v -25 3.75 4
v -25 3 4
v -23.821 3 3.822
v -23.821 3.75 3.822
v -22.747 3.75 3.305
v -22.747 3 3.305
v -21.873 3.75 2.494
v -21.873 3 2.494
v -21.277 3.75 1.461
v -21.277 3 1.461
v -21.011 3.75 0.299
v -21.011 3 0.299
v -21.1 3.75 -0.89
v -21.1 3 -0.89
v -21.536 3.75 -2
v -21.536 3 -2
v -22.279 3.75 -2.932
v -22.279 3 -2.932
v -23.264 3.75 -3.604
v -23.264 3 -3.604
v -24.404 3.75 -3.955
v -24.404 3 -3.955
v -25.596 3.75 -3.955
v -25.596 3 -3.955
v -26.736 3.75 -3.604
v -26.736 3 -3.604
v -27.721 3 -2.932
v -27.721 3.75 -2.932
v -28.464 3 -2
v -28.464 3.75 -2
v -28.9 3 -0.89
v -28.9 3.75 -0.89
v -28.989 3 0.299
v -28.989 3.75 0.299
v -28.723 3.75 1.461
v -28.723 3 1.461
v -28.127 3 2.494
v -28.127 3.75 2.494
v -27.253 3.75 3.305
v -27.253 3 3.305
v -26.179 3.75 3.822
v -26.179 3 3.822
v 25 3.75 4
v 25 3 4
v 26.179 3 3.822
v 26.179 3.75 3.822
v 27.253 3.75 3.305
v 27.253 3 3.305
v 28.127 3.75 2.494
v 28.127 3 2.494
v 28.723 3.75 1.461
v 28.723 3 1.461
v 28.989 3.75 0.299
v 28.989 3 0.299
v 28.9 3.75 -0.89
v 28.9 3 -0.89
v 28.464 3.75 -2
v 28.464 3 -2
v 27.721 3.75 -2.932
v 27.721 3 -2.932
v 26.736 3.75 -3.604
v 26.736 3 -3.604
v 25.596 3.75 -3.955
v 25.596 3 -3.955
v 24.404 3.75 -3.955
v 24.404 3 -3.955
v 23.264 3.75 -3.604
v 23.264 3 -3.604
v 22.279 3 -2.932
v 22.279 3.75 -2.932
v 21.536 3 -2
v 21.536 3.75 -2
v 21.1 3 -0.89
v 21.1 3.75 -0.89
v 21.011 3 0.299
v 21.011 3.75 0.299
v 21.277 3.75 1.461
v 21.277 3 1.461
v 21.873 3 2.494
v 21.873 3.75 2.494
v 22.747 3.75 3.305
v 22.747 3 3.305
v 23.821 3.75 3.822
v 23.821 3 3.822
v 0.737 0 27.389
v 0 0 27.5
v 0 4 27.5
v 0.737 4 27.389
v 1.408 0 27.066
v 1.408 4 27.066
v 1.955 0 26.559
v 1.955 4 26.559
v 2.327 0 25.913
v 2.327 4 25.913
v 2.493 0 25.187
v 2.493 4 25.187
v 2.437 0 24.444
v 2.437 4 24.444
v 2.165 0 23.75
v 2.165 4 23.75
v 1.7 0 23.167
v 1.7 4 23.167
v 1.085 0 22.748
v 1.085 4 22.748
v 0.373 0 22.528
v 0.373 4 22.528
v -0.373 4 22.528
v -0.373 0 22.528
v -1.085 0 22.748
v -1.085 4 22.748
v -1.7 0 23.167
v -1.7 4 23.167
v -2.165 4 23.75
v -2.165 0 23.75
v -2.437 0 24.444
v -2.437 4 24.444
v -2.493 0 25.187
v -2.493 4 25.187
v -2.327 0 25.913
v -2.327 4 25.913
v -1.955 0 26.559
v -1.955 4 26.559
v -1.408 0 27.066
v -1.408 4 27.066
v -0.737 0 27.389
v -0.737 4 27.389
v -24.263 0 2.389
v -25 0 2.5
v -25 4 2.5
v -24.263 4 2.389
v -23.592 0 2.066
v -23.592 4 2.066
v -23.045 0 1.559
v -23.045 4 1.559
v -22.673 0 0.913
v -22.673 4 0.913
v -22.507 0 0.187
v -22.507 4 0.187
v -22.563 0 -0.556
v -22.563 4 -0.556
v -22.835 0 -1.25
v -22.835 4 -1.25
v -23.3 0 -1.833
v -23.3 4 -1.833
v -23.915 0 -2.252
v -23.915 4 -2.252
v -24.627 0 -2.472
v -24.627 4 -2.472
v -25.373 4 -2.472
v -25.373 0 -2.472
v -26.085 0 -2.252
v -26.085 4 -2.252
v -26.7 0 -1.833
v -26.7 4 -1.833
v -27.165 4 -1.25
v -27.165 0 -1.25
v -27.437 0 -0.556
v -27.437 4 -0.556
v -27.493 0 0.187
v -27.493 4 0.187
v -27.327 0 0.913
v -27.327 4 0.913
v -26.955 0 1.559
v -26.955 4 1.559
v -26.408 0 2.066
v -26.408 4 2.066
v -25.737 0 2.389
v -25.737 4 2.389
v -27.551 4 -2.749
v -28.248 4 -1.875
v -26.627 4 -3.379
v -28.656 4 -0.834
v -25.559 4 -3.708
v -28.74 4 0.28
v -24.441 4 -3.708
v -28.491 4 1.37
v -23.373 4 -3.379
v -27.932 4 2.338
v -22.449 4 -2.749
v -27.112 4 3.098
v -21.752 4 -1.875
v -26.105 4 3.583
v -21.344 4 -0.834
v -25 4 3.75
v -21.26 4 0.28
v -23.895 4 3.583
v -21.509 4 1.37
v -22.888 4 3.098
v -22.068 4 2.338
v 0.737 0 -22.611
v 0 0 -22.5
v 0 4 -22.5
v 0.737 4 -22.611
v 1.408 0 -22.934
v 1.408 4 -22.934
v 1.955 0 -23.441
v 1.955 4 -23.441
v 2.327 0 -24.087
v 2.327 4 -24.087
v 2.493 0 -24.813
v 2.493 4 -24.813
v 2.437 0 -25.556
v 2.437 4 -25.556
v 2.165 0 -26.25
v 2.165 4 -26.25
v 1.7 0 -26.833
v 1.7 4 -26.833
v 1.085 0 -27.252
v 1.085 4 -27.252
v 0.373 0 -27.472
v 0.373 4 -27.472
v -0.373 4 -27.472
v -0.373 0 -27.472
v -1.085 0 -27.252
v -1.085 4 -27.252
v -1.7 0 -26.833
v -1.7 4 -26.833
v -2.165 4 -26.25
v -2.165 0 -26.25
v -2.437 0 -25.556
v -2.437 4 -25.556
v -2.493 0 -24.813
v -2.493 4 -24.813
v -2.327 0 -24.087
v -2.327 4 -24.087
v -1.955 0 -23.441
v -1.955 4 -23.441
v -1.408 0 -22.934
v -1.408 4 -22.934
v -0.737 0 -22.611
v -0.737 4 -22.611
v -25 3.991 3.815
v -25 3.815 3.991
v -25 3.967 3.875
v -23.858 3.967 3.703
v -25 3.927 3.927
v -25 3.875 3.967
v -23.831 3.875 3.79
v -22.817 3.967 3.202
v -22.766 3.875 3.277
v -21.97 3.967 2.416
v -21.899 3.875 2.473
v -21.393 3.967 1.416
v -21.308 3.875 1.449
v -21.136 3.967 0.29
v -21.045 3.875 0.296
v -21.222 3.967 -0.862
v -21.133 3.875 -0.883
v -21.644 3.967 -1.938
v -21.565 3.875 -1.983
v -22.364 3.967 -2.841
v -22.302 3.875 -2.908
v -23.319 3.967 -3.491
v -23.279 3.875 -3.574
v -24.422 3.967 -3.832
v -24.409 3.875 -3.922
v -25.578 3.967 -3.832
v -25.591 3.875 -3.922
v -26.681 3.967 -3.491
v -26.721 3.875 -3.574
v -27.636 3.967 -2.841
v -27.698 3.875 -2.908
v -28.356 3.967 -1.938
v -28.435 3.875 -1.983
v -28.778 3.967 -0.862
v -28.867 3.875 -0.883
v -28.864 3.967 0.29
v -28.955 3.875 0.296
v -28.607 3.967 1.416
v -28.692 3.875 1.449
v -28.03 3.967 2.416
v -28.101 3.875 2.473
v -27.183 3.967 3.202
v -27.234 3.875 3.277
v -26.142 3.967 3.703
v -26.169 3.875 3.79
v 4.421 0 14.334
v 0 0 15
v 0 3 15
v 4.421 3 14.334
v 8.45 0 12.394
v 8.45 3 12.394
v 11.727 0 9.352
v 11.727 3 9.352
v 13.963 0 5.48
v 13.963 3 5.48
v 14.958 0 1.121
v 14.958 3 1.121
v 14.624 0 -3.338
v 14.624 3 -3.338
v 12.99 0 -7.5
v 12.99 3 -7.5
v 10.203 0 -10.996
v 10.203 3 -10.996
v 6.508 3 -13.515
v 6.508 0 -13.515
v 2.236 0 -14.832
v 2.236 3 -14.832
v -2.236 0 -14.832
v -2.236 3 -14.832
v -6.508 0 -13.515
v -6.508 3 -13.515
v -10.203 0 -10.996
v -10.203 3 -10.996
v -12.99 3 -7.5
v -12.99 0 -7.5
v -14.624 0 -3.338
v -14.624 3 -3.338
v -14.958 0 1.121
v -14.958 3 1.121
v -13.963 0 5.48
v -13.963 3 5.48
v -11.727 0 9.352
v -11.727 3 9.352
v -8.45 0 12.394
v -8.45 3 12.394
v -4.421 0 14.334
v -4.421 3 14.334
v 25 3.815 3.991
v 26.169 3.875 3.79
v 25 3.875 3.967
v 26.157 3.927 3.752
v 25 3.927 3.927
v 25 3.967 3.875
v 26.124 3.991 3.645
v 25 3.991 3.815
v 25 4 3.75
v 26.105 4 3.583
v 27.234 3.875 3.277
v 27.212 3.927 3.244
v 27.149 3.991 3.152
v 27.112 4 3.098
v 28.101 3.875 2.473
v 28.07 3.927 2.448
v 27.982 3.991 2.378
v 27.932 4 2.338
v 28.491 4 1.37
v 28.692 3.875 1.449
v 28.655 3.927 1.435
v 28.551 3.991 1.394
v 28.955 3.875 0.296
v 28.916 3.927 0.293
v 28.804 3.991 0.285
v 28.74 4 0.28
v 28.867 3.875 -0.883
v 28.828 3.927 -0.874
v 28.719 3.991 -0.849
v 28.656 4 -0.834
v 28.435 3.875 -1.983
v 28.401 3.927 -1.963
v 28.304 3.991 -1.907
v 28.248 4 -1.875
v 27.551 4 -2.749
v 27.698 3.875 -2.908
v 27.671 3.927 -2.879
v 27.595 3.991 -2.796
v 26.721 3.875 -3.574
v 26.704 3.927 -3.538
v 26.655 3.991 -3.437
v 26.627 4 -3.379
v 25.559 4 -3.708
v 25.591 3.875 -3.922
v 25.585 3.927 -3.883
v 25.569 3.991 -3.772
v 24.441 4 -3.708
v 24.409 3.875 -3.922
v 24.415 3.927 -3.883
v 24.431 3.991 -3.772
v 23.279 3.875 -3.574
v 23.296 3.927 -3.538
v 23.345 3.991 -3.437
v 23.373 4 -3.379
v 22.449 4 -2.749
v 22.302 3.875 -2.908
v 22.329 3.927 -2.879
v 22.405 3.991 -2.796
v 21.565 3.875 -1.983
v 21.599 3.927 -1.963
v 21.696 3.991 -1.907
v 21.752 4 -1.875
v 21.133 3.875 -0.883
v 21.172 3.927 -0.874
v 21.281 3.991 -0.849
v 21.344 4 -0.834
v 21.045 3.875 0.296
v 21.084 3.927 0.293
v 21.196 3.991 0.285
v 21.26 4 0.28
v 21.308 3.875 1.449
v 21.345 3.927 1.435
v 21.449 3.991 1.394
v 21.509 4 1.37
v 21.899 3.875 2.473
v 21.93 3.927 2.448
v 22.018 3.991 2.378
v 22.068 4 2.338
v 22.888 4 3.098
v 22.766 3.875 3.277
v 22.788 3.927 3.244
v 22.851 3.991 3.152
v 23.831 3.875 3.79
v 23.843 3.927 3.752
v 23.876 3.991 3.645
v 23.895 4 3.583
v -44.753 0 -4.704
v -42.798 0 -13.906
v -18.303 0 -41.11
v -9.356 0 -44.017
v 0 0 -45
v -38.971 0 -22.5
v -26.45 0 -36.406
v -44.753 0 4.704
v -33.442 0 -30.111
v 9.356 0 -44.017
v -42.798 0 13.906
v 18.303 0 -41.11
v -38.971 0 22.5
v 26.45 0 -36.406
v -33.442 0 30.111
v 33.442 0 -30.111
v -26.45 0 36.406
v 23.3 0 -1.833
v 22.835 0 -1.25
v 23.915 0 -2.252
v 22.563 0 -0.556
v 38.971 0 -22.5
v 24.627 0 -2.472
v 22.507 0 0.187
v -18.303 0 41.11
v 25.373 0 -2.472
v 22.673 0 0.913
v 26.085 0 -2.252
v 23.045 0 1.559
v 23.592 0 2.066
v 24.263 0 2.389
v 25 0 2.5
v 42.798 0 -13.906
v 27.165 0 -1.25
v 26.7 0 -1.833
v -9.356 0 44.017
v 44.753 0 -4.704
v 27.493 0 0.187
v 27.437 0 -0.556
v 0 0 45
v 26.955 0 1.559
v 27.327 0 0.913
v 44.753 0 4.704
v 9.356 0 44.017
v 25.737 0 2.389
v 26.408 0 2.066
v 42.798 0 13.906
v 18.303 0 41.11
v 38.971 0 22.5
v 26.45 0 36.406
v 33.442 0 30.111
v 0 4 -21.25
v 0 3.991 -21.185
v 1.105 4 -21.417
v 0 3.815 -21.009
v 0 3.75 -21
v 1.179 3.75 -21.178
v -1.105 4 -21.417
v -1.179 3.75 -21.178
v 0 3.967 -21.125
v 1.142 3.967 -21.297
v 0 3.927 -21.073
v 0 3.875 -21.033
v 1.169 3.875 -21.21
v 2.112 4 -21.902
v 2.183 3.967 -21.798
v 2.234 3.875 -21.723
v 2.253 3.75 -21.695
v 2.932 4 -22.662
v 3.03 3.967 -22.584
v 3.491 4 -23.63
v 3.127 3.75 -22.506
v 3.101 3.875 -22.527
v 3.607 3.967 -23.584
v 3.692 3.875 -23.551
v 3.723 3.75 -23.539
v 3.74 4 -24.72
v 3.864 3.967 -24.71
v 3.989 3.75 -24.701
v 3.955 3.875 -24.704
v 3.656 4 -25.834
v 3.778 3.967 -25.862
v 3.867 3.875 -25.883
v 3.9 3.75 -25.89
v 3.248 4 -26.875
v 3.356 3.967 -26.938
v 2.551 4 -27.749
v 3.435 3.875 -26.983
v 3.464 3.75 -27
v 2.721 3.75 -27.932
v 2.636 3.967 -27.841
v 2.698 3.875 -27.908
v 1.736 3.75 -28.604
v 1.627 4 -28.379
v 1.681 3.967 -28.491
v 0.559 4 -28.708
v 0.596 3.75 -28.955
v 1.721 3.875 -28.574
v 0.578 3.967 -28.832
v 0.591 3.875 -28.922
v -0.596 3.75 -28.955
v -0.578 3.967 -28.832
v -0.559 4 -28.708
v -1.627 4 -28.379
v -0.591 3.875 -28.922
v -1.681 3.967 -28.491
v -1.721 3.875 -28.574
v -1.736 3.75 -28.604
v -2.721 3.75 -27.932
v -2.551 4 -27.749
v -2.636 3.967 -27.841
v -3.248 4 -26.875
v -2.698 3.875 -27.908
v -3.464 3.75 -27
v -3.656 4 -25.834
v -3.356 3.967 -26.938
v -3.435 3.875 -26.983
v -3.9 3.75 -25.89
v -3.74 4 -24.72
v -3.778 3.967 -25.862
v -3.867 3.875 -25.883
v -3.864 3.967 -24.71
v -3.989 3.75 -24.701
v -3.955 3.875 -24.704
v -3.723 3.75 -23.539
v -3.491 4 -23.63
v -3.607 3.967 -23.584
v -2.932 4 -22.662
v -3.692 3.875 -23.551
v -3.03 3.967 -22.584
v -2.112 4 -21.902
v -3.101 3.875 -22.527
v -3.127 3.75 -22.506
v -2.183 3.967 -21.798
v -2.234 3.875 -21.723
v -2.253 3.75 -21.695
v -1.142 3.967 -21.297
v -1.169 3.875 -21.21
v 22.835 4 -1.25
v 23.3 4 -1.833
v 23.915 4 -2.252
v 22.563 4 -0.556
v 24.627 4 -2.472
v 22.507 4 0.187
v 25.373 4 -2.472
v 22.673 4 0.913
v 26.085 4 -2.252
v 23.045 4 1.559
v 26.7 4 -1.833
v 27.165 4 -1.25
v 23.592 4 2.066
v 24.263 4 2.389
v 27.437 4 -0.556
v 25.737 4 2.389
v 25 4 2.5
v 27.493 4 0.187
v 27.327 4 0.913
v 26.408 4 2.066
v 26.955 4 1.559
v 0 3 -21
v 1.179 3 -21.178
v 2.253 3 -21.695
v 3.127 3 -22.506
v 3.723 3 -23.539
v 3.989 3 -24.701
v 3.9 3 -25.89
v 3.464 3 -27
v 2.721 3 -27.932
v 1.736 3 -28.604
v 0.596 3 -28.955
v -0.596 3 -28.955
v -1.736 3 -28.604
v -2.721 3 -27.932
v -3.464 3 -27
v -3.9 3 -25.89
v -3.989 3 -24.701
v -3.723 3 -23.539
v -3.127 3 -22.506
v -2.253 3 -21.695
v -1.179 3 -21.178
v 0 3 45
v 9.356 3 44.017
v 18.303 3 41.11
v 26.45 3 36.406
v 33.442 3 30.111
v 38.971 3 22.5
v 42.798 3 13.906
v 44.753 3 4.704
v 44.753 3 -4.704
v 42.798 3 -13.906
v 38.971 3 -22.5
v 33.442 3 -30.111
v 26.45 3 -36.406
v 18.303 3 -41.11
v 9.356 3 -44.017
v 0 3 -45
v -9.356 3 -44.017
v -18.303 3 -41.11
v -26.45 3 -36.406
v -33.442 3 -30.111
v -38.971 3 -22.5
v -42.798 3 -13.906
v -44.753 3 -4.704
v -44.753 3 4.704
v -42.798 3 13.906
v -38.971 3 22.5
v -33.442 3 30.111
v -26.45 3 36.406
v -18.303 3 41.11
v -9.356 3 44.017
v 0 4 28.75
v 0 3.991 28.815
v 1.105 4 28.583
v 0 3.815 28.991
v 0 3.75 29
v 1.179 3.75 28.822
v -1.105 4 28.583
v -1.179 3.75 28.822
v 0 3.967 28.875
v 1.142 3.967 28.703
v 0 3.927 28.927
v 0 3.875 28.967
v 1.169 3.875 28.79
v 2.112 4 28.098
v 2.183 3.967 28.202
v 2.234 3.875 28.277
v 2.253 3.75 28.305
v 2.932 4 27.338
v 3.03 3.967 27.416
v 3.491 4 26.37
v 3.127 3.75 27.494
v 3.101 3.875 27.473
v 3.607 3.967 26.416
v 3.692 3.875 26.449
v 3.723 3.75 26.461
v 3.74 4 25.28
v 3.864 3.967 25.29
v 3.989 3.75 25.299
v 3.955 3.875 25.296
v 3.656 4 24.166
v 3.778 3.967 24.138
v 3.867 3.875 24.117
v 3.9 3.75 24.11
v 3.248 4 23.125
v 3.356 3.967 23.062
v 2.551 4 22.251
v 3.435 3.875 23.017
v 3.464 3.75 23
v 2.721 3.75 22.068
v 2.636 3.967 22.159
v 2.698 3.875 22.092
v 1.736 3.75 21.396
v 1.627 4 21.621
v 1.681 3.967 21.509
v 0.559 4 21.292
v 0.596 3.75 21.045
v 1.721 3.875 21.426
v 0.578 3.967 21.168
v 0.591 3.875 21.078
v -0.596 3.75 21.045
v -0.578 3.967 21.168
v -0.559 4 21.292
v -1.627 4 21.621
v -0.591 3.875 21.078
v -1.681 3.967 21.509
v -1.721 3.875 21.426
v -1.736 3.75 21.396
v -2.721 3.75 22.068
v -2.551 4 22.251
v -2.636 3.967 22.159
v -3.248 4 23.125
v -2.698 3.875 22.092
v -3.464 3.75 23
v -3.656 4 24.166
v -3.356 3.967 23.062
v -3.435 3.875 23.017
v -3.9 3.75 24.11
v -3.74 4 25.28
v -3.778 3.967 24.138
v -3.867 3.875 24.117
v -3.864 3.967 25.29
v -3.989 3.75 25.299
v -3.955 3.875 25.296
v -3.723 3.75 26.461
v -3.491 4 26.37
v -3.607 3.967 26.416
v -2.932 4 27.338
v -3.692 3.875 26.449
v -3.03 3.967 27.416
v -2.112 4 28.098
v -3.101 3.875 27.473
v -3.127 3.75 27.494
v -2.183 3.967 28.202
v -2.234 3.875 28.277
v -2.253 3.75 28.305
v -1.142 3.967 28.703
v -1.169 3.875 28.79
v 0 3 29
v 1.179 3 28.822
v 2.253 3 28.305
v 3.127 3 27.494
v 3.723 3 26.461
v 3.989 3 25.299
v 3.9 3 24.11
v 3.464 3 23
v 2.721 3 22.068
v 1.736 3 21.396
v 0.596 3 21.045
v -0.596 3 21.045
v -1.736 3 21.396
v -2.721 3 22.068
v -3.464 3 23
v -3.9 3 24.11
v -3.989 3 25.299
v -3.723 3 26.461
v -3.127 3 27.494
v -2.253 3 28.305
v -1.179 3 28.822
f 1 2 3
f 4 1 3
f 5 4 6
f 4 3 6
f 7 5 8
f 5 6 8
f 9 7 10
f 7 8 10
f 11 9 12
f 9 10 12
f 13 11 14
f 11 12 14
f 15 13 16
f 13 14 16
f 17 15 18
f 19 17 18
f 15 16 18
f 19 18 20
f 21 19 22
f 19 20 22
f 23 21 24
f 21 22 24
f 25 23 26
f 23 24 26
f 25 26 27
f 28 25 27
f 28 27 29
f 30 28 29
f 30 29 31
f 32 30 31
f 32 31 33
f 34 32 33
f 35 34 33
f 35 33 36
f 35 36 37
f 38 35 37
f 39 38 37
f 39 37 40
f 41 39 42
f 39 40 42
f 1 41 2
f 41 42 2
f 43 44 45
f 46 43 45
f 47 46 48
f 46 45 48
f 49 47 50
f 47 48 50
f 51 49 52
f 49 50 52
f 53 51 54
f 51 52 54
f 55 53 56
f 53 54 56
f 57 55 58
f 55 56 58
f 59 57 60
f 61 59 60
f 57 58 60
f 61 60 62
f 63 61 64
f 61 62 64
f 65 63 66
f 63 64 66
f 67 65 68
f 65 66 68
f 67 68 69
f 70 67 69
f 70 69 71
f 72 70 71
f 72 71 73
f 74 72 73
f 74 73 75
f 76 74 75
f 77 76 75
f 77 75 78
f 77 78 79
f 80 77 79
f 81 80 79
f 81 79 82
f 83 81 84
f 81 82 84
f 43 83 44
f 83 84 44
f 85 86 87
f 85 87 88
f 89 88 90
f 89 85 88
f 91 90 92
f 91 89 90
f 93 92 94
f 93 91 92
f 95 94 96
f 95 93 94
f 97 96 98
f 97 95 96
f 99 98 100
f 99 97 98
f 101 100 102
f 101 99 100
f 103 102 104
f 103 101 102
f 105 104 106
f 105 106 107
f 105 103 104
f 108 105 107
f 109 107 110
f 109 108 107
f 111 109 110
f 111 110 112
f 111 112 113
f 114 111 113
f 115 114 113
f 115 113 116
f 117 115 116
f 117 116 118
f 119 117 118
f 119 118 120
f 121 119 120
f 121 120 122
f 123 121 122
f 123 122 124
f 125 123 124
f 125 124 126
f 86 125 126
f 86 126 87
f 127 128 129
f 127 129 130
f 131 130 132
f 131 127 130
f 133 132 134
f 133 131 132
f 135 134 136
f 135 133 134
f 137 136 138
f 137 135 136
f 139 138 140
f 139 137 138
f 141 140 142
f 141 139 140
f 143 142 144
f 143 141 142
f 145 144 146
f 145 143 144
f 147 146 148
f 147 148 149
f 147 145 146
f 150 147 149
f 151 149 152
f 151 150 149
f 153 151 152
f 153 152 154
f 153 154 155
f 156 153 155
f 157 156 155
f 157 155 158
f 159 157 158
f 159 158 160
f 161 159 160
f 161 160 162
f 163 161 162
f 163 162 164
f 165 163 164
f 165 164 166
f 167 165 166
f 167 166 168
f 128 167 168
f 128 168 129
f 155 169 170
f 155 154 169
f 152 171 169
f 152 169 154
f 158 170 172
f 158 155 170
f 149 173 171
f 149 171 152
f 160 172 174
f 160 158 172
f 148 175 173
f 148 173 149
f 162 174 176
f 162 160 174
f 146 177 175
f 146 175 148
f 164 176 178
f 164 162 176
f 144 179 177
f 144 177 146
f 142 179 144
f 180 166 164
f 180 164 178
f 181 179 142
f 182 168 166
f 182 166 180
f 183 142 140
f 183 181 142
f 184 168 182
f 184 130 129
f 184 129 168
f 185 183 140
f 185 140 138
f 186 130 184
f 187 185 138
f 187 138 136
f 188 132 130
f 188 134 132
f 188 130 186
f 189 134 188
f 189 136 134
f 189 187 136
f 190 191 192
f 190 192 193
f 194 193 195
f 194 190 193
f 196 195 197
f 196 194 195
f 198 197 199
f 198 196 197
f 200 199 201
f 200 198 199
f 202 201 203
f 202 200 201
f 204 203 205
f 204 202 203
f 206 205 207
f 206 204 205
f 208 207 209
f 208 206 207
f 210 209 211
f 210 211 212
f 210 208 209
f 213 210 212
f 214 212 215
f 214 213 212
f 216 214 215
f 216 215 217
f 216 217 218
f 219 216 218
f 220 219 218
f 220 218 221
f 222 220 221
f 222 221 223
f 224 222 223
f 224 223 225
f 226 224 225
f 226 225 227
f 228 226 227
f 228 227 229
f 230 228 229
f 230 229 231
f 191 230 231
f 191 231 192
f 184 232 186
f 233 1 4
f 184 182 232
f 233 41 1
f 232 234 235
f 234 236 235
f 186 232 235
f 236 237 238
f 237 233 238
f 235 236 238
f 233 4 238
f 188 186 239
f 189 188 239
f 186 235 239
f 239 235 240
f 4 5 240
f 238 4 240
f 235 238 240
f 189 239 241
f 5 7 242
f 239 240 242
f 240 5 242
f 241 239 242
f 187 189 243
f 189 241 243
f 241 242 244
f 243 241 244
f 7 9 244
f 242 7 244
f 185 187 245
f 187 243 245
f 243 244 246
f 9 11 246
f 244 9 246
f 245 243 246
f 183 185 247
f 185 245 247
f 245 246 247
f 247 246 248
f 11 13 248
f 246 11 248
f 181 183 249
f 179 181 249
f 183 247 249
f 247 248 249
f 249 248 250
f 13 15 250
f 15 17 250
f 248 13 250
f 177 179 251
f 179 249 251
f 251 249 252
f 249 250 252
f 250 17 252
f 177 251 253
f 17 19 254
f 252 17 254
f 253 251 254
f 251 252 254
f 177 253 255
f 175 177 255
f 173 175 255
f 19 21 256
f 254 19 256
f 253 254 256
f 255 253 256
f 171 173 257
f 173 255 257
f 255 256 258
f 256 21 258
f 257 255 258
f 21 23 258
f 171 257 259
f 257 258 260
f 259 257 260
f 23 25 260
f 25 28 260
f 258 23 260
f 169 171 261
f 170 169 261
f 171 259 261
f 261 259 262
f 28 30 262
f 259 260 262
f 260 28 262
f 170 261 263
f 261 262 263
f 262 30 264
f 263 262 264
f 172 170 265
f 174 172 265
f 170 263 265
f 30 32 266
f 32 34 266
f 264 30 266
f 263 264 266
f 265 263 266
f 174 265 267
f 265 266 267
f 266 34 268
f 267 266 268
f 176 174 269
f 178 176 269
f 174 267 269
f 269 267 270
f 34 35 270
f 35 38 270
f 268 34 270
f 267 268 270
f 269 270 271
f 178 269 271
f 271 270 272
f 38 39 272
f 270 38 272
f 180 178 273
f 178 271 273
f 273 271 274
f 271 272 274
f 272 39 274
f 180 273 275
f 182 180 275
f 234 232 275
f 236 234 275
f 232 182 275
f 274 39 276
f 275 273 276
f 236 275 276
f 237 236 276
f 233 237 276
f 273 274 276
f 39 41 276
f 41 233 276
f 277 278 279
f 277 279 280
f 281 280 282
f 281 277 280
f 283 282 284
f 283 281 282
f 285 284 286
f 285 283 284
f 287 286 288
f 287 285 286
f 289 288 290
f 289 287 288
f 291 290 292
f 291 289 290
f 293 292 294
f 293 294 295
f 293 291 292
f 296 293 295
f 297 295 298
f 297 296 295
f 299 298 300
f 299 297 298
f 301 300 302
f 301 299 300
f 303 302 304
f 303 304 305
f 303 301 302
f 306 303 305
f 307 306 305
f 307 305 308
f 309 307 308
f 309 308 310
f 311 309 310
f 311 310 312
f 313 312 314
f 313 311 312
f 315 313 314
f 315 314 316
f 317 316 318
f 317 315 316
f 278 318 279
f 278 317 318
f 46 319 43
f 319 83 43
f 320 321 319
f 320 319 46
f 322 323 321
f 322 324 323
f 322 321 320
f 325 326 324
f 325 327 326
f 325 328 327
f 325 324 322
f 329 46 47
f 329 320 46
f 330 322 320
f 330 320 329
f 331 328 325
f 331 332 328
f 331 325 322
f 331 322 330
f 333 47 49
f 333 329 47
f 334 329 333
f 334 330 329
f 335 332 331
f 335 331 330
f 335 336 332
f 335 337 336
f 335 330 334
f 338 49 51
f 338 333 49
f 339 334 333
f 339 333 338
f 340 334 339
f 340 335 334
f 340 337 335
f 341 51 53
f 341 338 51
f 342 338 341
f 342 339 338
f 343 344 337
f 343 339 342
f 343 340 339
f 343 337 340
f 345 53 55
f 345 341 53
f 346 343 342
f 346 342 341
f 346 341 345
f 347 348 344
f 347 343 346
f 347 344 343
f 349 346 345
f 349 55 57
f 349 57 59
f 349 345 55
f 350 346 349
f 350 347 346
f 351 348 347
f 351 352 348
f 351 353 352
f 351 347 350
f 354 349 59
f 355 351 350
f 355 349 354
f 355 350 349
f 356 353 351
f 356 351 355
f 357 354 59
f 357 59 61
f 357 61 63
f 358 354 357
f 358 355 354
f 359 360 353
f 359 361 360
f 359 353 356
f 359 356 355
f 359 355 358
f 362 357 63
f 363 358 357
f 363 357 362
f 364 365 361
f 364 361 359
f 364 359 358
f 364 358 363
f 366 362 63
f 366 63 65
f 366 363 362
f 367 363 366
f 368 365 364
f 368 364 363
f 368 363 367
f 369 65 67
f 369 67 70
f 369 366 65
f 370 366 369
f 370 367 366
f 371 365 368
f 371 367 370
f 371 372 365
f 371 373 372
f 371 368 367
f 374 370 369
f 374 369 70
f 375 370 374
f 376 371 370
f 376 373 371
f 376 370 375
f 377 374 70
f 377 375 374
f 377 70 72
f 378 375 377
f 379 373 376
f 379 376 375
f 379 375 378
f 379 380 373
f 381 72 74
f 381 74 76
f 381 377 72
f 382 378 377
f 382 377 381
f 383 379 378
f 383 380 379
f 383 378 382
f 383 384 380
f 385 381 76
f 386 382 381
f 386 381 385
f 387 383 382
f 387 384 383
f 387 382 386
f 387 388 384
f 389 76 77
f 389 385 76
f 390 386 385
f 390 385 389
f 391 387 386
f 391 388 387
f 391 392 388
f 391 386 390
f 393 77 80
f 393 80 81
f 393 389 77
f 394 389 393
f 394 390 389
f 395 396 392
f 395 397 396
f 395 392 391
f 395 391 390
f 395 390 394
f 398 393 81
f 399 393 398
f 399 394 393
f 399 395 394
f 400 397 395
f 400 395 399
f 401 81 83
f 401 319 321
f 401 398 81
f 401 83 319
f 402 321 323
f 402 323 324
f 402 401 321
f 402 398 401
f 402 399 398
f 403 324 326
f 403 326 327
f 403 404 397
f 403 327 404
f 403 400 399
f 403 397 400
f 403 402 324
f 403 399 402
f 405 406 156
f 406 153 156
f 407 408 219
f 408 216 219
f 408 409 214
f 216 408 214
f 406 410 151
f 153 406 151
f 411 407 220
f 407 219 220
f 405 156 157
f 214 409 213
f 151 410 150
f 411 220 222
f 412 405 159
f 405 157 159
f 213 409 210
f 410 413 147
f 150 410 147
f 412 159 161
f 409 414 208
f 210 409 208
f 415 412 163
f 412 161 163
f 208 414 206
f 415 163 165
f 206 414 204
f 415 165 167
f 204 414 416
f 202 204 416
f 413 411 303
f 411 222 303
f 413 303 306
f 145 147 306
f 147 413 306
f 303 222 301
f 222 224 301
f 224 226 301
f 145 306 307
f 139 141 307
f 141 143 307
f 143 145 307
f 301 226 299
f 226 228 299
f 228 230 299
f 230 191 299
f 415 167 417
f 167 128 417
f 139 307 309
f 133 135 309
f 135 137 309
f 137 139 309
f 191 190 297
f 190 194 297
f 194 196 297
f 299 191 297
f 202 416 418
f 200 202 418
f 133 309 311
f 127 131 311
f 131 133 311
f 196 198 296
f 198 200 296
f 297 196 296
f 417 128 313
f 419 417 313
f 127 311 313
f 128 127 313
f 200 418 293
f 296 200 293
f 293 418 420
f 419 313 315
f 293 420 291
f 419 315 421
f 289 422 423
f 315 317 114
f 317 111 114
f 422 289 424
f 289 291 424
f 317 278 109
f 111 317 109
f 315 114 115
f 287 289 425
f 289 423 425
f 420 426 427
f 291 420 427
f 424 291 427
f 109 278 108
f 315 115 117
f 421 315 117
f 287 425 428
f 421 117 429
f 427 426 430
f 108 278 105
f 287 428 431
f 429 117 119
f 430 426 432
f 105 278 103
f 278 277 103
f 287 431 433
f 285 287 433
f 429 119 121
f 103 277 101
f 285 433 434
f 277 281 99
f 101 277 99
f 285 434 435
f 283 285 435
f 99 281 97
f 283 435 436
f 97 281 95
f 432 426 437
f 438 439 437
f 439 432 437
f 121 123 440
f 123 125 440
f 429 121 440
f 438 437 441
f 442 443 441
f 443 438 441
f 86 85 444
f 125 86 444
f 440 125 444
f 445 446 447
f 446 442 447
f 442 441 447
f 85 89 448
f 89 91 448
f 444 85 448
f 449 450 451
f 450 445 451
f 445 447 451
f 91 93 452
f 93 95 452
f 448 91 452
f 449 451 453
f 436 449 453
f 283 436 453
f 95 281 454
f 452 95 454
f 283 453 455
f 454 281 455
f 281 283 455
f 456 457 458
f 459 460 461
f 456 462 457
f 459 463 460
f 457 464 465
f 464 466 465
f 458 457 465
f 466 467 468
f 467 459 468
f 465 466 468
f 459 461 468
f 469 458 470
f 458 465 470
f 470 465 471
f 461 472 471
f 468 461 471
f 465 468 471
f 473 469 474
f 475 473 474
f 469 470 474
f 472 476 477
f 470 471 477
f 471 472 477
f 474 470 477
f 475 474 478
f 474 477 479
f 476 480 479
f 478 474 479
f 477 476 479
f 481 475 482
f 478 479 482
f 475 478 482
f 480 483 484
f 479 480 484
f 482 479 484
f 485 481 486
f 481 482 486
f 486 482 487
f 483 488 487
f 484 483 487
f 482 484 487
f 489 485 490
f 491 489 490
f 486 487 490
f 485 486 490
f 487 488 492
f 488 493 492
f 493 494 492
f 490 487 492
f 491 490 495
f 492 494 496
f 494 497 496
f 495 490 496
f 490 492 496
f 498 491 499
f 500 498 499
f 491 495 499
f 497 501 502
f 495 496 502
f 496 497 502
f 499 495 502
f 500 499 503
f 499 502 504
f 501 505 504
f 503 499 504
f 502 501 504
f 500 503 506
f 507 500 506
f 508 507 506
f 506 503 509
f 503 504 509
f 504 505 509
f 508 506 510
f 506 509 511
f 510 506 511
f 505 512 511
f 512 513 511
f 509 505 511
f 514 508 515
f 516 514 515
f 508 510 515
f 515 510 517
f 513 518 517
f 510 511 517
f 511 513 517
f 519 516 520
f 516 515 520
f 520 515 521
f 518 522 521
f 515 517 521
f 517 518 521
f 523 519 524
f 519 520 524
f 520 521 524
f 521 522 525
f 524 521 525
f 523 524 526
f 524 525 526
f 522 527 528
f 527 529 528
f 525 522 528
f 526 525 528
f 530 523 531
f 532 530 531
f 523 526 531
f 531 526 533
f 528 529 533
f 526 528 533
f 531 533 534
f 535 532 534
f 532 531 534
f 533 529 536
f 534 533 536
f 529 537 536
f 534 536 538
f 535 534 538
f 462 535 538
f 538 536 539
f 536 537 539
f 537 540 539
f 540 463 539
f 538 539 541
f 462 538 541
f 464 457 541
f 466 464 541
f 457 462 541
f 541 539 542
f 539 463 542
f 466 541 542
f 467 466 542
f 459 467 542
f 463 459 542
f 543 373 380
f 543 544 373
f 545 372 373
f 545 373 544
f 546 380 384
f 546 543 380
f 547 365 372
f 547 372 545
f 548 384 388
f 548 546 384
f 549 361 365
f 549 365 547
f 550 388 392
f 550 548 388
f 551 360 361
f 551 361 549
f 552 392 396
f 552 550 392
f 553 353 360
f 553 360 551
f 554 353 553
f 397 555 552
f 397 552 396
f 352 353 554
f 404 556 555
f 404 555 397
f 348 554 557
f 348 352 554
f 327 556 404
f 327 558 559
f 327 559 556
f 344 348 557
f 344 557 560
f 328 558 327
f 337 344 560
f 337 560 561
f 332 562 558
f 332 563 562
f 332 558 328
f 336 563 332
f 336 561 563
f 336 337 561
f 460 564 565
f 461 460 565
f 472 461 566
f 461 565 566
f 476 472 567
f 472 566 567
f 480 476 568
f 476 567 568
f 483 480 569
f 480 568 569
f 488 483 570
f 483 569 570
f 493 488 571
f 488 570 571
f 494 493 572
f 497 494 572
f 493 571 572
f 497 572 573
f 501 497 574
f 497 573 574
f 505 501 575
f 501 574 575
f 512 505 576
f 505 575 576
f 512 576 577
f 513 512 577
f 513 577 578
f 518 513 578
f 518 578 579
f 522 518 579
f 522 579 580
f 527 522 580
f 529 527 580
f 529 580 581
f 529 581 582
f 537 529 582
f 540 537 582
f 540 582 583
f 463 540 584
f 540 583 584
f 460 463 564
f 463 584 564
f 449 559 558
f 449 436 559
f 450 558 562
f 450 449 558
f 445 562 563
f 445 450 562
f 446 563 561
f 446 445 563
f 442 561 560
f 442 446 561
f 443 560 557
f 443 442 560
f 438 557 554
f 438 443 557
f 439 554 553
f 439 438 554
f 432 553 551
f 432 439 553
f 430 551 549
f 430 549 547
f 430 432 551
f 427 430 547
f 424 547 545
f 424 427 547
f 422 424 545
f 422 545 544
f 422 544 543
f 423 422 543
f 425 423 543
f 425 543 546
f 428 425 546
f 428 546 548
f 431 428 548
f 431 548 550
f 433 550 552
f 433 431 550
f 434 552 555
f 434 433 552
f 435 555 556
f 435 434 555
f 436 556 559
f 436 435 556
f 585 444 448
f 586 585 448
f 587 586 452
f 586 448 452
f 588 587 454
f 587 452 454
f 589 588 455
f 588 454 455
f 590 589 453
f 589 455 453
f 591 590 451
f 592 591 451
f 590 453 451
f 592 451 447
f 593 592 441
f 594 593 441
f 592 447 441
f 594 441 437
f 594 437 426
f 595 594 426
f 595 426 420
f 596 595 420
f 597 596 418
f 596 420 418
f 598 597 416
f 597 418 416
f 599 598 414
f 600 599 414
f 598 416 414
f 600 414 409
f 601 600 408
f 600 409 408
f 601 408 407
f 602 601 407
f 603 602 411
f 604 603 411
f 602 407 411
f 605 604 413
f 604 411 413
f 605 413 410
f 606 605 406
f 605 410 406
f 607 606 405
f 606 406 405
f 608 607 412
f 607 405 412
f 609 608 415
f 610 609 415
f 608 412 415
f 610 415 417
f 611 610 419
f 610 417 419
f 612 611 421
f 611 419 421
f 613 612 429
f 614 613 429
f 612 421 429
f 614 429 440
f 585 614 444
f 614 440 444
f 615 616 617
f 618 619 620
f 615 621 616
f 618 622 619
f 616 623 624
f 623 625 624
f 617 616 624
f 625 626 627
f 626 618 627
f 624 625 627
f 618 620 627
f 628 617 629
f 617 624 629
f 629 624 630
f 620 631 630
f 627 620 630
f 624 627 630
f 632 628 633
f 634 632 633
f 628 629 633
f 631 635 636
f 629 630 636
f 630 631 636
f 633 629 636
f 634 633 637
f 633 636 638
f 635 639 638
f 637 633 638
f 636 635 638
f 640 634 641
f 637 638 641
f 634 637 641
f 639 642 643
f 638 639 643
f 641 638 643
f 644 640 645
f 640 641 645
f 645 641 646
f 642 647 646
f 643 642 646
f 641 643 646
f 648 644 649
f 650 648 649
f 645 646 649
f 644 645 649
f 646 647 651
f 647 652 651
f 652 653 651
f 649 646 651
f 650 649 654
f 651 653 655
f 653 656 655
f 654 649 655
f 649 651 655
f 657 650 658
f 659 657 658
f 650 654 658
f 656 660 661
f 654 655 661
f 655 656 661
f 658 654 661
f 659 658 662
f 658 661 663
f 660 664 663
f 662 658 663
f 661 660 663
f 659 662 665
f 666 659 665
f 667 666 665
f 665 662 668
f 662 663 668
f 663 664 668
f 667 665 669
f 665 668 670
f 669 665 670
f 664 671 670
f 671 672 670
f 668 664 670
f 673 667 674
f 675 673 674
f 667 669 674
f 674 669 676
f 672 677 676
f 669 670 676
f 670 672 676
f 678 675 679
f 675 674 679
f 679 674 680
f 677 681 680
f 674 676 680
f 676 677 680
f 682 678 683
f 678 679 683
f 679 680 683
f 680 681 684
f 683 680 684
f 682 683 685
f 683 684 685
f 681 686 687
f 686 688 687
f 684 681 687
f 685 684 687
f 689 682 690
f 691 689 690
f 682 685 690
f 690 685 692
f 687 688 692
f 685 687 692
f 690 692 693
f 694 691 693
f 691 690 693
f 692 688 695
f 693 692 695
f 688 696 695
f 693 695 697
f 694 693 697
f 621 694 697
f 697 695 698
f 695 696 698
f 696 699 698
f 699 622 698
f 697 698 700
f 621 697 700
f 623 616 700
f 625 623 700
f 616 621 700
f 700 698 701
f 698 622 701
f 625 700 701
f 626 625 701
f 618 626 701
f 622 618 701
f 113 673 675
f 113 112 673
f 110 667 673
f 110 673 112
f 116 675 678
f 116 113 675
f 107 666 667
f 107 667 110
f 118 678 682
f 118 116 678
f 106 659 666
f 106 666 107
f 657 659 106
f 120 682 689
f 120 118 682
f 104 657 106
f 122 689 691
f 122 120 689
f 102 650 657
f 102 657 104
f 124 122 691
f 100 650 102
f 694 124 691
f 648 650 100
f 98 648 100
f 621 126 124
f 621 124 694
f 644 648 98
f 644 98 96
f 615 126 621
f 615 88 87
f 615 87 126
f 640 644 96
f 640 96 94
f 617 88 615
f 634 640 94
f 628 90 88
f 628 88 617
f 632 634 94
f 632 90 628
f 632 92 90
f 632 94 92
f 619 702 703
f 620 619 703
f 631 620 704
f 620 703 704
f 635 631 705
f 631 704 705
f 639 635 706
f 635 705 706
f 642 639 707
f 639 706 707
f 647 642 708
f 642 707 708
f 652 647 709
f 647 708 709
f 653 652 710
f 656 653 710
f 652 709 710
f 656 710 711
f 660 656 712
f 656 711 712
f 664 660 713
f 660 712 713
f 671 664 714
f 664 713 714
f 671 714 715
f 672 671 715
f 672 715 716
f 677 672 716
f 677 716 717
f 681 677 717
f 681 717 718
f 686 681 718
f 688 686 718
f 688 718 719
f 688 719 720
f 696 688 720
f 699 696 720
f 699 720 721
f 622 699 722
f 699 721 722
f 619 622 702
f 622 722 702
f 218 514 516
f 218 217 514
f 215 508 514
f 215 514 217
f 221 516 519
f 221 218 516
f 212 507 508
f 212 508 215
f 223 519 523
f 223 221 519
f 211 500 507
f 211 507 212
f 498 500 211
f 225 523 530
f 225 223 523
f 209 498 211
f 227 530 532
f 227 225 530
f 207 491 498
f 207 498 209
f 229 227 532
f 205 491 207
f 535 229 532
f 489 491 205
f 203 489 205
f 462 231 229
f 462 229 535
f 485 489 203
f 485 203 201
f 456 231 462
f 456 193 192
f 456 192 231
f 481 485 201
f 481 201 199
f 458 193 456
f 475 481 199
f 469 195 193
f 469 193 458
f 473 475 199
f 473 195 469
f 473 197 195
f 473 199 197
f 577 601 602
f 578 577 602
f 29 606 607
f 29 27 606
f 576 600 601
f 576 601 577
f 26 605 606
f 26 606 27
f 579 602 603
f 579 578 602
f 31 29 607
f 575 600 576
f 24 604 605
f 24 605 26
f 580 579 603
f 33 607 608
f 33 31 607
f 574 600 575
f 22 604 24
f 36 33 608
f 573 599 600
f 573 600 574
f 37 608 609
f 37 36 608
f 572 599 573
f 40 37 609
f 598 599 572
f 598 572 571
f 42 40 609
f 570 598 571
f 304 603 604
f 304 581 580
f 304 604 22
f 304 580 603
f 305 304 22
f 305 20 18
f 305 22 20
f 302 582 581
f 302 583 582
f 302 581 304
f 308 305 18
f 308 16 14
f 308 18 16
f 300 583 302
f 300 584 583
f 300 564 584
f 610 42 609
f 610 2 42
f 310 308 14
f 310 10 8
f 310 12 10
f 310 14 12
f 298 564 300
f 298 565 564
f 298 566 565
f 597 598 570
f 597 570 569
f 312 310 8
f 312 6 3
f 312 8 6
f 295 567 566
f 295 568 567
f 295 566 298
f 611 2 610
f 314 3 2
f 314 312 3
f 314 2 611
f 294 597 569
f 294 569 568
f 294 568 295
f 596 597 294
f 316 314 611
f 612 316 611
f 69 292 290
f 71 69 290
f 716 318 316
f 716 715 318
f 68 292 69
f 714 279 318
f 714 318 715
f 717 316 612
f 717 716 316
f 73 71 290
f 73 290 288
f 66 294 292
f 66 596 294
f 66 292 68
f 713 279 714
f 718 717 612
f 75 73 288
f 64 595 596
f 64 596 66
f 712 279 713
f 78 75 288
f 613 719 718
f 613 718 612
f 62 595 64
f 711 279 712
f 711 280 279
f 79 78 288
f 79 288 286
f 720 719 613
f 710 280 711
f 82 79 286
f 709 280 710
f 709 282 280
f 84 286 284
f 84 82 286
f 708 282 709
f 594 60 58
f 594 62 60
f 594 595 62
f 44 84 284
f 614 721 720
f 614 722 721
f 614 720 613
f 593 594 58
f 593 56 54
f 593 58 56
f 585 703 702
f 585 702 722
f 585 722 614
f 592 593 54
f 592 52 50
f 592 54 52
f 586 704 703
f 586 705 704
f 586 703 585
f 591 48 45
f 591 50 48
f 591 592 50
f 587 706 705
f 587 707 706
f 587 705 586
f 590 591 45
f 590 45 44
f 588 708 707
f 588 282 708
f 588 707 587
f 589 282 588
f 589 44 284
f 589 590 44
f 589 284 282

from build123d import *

# Parameters (mm, degrees)
SKETCH1_R           = 45
SKETCH1_R_2         = 15
SKETCH1_R_3         = 2.5
BOSS_EXTRUDE1_DEPTH = 3
SKETCH2_R           = 4
SKETCH2_R_2         = 2.5
BOSS_EXTRUDE2_DEPTH = 1
FILLET1_R           = 0.25


with BuildPart() as part:
    # Sketch1 → Boss-Extrude1 (new body)
    with BuildSketch(Plane(origin=(0, 0, 0), x_dir=(1, 0, 0), z_dir=(0, 1, 0))):
        with Locations(Location((0, 0, 0), (0, 0, 270))):
            Circle(SKETCH1_R)
        with Locations(Location((0, 0, 0), (0, 0, 270))):
            Circle(SKETCH1_R_2, mode=Mode.SUBTRACT)
        with Locations(Location((0, 25, 0), (0, 0, 270))):
            Circle(SKETCH1_R_3, mode=Mode.SUBTRACT)
        with Locations(Location((25, 0, 0), (0, 0, 270))):
            Circle(SKETCH1_R_3, mode=Mode.SUBTRACT)
        with Locations(Location((0, -25, 0), (0, 0, 270))):
            Circle(SKETCH1_R_3, mode=Mode.SUBTRACT)
        with Locations(Location((-25, 0, 0), (0, 0, 270))):
            Circle(SKETCH1_R_3, mode=Mode.SUBTRACT)
    extrude(amount=BOSS_EXTRUDE1_DEPTH)

    # Sketch2 → Boss-Extrude2 (add)
    # profile 1 of 4: a face of its own
    with BuildSketch(Plane(origin=(0, 3, 0), x_dir=(1, 0, 0), z_dir=(0, 1, 0))):
        with Locations(Location((25, 0, 0), (0, 0, 270))):
            Circle(SKETCH2_R)
        with Locations(Location((25, 0, 0), (0, 0, 270))):
            Circle(SKETCH2_R_2, mode=Mode.SUBTRACT)
    # profile 2 of 4: a face of its own
    with BuildSketch(Plane(origin=(0, 3, 0), x_dir=(1, 0, 0), z_dir=(0, 1, 0))):
        with Locations(Location((0, 25, 0), (0, 0, 270))):
            Circle(SKETCH2_R)
        with Locations(Location((0, 25, 0), (0, 0, 270))):
            Circle(SKETCH2_R_2, mode=Mode.SUBTRACT)
    # profile 3 of 4: a face of its own
    with BuildSketch(Plane(origin=(0, 3, 0), x_dir=(1, 0, 0), z_dir=(0, 1, 0))):
        with Locations(Location((0, -25, 0), (0, 0, 270))):
            Circle(SKETCH2_R)
        with Locations(Location((0, -25, 0), (0, 0, 270))):
            Circle(SKETCH2_R_2, mode=Mode.SUBTRACT)
    # profile 4 of 4: a face of its own
    with BuildSketch(Plane(origin=(0, 3, 0), x_dir=(1, 0, 0), z_dir=(0, 1, 0))):
        with Locations(Location((-25, 0, 0), (0, 0, 270))):
            Circle(SKETCH2_R)
        with Locations(Location((-25, 0, 0), (0, 0, 270))):
            Circle(SKETCH2_R_2, mode=Mode.SUBTRACT)
    extrude(amount=BOSS_EXTRUDE2_DEPTH)

    # Fillet1
    fillet1_edges = [part.edges().sort_by_distance(p)[0] for p in [
        (-25, 4, -4),
        (0, 4, 21),
        (25, 4, -4),
        (0, 4, -29),
    ]]
    fillet(fillet1_edges, radius=FILLET1_R)


solid = part.part
